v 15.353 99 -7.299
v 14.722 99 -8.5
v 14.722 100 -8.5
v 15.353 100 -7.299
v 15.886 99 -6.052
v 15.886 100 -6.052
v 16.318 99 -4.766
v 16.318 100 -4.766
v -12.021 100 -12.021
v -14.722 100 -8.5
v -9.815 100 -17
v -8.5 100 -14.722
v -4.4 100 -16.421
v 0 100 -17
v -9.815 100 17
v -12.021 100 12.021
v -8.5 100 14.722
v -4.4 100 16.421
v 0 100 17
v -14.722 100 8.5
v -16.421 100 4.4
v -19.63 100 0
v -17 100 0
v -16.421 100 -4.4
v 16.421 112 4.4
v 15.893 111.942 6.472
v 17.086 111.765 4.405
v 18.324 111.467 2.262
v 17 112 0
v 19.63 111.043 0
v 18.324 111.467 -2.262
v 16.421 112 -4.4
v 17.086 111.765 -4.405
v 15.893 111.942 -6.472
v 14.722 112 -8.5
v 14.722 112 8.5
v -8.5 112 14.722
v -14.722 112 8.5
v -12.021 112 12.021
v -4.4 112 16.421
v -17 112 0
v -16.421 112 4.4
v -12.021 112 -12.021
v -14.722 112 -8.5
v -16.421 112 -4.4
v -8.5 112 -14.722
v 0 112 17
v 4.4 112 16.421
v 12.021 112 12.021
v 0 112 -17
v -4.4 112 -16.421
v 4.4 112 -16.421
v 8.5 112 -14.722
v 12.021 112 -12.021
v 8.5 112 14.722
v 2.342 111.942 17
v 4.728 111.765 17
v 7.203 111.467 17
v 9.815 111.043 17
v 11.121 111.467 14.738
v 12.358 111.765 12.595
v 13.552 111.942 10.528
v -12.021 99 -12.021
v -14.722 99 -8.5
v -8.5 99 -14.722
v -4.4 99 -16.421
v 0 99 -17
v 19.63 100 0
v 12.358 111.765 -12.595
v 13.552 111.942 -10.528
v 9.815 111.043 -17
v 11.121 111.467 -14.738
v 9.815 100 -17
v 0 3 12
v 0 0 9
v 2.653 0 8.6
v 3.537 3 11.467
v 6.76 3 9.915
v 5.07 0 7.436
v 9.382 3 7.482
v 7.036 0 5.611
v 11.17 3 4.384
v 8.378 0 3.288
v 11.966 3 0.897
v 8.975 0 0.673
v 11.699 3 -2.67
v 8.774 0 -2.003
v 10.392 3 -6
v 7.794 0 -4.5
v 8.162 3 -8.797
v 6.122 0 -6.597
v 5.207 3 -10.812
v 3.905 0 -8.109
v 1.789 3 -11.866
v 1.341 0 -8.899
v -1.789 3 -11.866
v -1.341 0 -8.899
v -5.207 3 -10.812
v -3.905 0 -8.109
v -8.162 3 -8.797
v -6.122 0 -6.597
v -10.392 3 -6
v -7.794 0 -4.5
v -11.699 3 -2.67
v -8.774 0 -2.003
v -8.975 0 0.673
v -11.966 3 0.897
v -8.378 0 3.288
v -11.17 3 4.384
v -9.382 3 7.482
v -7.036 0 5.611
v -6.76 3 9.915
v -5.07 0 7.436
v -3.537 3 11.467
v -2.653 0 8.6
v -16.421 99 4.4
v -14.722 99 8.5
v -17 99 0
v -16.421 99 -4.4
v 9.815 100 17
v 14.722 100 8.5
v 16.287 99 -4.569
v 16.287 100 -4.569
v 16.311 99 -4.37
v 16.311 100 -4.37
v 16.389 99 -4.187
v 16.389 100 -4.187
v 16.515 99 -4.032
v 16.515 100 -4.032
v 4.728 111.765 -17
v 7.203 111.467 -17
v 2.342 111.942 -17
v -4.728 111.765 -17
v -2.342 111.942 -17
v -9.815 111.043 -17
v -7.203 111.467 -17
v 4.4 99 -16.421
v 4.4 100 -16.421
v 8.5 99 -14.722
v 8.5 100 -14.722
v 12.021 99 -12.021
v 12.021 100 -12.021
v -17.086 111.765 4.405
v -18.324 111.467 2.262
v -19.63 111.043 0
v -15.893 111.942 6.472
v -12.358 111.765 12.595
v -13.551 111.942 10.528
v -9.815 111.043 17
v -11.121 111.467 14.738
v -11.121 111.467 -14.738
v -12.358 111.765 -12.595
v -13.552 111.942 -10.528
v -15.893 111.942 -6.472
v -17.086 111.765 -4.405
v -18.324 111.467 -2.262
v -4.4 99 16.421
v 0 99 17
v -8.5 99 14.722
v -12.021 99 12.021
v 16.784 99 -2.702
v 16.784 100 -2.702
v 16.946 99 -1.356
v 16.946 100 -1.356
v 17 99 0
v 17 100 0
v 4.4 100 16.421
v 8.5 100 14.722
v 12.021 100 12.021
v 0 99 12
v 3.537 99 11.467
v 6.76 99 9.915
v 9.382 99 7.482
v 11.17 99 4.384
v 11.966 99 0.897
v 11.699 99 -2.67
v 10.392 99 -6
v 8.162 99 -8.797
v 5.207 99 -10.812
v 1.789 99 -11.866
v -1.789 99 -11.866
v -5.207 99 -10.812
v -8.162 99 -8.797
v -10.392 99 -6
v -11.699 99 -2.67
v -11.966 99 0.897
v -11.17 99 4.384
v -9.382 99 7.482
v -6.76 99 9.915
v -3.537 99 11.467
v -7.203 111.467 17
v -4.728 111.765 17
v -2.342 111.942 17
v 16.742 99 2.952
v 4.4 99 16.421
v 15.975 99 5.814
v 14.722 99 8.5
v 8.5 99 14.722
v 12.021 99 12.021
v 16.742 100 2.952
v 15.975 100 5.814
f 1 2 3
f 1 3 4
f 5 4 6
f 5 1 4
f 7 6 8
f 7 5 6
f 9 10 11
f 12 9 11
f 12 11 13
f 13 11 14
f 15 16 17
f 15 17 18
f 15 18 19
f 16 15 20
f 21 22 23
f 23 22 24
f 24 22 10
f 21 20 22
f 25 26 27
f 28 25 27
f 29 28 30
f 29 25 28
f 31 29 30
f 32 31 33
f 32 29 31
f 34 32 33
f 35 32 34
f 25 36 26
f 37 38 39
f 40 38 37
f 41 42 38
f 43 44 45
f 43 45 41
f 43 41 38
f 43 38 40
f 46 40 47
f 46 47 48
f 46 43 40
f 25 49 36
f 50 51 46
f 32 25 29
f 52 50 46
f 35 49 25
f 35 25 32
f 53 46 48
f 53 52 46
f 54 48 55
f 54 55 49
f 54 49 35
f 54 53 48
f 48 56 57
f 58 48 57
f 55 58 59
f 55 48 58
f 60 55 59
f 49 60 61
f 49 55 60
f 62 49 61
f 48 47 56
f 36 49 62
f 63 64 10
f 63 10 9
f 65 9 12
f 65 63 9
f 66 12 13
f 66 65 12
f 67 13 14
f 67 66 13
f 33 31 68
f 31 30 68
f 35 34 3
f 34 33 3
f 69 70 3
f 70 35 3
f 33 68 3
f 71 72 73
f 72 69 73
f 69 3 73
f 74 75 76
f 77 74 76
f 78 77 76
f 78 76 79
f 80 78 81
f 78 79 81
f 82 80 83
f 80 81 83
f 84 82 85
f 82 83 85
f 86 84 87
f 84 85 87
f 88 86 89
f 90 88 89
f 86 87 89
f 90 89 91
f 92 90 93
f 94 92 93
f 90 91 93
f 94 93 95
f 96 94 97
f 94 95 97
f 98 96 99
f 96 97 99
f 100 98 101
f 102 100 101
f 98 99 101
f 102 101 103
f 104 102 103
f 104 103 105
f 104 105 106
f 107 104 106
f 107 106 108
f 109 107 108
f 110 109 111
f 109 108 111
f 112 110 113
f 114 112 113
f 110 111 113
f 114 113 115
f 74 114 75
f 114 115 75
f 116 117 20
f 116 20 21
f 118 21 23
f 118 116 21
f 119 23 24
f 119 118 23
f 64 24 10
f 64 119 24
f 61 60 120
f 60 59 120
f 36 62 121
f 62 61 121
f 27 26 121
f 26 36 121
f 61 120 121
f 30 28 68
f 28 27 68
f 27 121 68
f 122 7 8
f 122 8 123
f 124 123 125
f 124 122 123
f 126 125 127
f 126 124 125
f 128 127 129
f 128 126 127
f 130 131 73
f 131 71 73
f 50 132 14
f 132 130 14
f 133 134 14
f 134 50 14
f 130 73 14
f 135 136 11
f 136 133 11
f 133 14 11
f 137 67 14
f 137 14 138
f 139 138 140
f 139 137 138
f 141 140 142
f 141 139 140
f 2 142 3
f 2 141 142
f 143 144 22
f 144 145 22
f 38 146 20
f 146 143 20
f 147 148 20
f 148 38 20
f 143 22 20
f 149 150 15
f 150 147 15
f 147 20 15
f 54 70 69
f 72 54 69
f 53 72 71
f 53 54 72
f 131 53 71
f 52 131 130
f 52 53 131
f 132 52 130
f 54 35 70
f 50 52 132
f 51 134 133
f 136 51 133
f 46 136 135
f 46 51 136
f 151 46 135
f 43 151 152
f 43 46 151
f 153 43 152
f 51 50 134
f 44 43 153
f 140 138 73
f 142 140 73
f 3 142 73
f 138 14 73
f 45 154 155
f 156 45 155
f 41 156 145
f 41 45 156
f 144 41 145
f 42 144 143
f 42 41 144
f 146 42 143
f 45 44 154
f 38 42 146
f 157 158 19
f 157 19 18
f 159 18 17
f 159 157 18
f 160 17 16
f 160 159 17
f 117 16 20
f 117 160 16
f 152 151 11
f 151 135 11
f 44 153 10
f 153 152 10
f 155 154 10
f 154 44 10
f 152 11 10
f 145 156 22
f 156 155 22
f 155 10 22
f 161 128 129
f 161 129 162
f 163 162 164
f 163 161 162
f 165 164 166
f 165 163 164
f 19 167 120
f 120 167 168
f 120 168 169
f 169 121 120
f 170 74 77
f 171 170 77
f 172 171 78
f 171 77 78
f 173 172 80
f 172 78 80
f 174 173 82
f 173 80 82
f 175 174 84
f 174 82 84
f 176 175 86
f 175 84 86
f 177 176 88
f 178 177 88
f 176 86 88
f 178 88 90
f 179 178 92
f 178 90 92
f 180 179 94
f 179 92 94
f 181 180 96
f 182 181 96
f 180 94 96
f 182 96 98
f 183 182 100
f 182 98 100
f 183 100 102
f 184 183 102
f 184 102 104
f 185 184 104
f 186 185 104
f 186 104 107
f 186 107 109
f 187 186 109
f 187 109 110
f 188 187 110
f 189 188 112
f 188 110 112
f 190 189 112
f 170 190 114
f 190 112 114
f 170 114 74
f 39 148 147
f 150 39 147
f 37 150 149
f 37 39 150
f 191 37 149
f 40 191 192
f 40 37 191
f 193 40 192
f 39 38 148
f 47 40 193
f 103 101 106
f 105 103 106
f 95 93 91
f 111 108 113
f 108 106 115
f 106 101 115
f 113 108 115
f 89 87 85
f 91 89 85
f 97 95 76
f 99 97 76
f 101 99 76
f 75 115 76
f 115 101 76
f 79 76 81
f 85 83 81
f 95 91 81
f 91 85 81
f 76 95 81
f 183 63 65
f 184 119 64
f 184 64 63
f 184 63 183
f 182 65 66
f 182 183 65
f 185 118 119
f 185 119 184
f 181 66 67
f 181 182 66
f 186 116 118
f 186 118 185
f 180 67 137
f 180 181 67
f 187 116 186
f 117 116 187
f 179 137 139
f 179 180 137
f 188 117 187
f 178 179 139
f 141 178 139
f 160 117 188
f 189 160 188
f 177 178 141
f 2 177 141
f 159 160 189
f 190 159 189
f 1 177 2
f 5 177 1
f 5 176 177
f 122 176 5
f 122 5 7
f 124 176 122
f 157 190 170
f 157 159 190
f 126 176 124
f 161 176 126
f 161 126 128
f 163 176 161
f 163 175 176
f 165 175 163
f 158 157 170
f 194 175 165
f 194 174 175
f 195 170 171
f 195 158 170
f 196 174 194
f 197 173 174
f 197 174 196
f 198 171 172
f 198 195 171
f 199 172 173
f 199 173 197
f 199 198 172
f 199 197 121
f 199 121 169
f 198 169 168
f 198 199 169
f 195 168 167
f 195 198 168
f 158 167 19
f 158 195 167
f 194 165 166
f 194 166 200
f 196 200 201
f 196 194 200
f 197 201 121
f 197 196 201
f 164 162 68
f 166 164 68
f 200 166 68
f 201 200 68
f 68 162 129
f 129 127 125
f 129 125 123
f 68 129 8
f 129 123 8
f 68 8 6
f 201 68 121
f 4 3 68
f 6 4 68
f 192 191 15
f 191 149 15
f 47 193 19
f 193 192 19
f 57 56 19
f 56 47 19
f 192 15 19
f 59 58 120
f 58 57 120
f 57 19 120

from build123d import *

# Parameters (mm, degrees)
SKETCH1_R           = 12
BOSS_EXTRUDE1_DEPTH = 100
BOSS_EXTRUDE2_DEPTH = 12
SKETCH4_OUTSIDE_W   = 131.89
SKETCH4_OUTSIDE_H   = 126.63
SKETCH4_OUTSIDE_R   = 17
CUT_EXTRUDE1_DEPTH  = 12
CUT_EXTRUDE1_DRAFT  = -70
BOSS_EXTRUDE3_START = 1
SKETCH5_R           = 12
BOSS_EXTRUDE3_DEPTH = 1
CHAMFER1_SIZE       = 3


with BuildPart() as part:
    # Sketch1 → Boss-Extrude1 (new body)
    with BuildSketch(Plane(origin=(0, 0, 0), x_dir=(1, 0, 0), z_dir=(0, 1, 0))):
        with Locations(Location((0, 0, 0), (0, 0, 270))):
            Circle(SKETCH1_R)
    extrude(amount=BOSS_EXTRUDE1_DEPTH)

    # Sketch2 → Boss-Extrude2 (add)
    with BuildSketch(Plane(origin=(0, 100, 0), x_dir=(1, 0, 0), z_dir=(0, 1, 0))):
        Polygon((19.629909152, 0), (9.814954576, 17), (-9.814954576, 17), (-19.629909152, 0), (-9.814954576, -17), (9.814954576, -17), align=None)
    extrude(amount=BOSS_EXTRUDE2_DEPTH)


with BuildPart() as cut_extrude1_tool:
    # Sketch4 outside → Cut-Extrude1 (with draft: the straight prism first)
    with BuildSketch(Plane(origin=(0, 112, 0), x_dir=(1, 0, 0), z_dir=(0, 1, 0))):
        Rectangle(SKETCH4_OUTSIDE_W, SKETCH4_OUTSIDE_H)
        Circle(SKETCH4_OUTSIDE_R, mode=Mode.SUBTRACT)
    extrude(amount=-CUT_EXTRUDE1_DEPTH)
    # Cut-Extrude1: the draft: its side faces are tilted about the plane it starts from
    cut_extrude1_sides = [cut_extrude1_tool.faces().sort_by_distance(p)[0] for p in [
        (0, 106, 63.315),
        (65.945, 106, 0),
        (0, 106, -63.315),
        (-65.945, 106, 0),
        (-17, 106, 0),
    ]]
    draft(cut_extrude1_sides, Plane(origin=(0, 112, 0), x_dir=(1, 0, 0), z_dir=(0, 1, 0)), CUT_EXTRUDE1_DRAFT)


with BuildPart() as part_1:
    add(part.part)

    # Cut-Extrude1: cut by cut_extrude1_tool
    add(cut_extrude1_tool.part, mode=Mode.SUBTRACT)

    # Sketch5 → Boss-Extrude3 (add)
    with BuildSketch(Plane.XZ.offset(-100).offset(BOSS_EXTRUDE3_START)):
        with BuildLine():
            ThreePointArc((16.51491761, -4.032058572), (16.878293743, -2.030566501), (17, 0))
            ThreePointArc((17, 0), (16.420739111, 4.399923526), (14.722432113, 8.499999569))
            ThreePointArc((14.722432113, 8.499999569), (8.500000217, 14.722431739), (3e-09, 17))
            ThreePointArc((3e-09, 17), (-8.500000031, 14.722431846), (-14.722431902, 8.499999935))
            ThreePointArc((-14.722431902, 8.499999935), (-17, -1.47e-07), (-14.722431755, -8.50000019))
            ThreePointArc((-14.722431755, -8.50000019), (-8.499999905, -14.722431919), (0, -17))
            ThreePointArc((0, -17), (8.499999905, -14.722431919), (14.722431755, -8.50000019))
            ThreePointArc((14.722431755, -8.50000019), (15.632314361, -6.680624799), (16.318367478, -4.765593652))
            ThreePointArc((16.318367478, -4.765593652), (16.310925004, -4.370499183), (16.51491761, -4.032058572))
        make_face()
        with Locations(Location((0, 0, 0), (0, 0, 270))):
            Circle(SKETCH5_R, mode=Mode.SUBTRACT)
    extrude(amount=-BOSS_EXTRUDE3_DEPTH)

    # Chamfer1
    chamfer1_edges = [part_1.edges().sort_by_distance(p)[0] for p in [
        (0, 0, -12),
    ]]
    chamfer(chamfer1_edges, length=CHAMFER1_SIZE)


solid = part_1.part
